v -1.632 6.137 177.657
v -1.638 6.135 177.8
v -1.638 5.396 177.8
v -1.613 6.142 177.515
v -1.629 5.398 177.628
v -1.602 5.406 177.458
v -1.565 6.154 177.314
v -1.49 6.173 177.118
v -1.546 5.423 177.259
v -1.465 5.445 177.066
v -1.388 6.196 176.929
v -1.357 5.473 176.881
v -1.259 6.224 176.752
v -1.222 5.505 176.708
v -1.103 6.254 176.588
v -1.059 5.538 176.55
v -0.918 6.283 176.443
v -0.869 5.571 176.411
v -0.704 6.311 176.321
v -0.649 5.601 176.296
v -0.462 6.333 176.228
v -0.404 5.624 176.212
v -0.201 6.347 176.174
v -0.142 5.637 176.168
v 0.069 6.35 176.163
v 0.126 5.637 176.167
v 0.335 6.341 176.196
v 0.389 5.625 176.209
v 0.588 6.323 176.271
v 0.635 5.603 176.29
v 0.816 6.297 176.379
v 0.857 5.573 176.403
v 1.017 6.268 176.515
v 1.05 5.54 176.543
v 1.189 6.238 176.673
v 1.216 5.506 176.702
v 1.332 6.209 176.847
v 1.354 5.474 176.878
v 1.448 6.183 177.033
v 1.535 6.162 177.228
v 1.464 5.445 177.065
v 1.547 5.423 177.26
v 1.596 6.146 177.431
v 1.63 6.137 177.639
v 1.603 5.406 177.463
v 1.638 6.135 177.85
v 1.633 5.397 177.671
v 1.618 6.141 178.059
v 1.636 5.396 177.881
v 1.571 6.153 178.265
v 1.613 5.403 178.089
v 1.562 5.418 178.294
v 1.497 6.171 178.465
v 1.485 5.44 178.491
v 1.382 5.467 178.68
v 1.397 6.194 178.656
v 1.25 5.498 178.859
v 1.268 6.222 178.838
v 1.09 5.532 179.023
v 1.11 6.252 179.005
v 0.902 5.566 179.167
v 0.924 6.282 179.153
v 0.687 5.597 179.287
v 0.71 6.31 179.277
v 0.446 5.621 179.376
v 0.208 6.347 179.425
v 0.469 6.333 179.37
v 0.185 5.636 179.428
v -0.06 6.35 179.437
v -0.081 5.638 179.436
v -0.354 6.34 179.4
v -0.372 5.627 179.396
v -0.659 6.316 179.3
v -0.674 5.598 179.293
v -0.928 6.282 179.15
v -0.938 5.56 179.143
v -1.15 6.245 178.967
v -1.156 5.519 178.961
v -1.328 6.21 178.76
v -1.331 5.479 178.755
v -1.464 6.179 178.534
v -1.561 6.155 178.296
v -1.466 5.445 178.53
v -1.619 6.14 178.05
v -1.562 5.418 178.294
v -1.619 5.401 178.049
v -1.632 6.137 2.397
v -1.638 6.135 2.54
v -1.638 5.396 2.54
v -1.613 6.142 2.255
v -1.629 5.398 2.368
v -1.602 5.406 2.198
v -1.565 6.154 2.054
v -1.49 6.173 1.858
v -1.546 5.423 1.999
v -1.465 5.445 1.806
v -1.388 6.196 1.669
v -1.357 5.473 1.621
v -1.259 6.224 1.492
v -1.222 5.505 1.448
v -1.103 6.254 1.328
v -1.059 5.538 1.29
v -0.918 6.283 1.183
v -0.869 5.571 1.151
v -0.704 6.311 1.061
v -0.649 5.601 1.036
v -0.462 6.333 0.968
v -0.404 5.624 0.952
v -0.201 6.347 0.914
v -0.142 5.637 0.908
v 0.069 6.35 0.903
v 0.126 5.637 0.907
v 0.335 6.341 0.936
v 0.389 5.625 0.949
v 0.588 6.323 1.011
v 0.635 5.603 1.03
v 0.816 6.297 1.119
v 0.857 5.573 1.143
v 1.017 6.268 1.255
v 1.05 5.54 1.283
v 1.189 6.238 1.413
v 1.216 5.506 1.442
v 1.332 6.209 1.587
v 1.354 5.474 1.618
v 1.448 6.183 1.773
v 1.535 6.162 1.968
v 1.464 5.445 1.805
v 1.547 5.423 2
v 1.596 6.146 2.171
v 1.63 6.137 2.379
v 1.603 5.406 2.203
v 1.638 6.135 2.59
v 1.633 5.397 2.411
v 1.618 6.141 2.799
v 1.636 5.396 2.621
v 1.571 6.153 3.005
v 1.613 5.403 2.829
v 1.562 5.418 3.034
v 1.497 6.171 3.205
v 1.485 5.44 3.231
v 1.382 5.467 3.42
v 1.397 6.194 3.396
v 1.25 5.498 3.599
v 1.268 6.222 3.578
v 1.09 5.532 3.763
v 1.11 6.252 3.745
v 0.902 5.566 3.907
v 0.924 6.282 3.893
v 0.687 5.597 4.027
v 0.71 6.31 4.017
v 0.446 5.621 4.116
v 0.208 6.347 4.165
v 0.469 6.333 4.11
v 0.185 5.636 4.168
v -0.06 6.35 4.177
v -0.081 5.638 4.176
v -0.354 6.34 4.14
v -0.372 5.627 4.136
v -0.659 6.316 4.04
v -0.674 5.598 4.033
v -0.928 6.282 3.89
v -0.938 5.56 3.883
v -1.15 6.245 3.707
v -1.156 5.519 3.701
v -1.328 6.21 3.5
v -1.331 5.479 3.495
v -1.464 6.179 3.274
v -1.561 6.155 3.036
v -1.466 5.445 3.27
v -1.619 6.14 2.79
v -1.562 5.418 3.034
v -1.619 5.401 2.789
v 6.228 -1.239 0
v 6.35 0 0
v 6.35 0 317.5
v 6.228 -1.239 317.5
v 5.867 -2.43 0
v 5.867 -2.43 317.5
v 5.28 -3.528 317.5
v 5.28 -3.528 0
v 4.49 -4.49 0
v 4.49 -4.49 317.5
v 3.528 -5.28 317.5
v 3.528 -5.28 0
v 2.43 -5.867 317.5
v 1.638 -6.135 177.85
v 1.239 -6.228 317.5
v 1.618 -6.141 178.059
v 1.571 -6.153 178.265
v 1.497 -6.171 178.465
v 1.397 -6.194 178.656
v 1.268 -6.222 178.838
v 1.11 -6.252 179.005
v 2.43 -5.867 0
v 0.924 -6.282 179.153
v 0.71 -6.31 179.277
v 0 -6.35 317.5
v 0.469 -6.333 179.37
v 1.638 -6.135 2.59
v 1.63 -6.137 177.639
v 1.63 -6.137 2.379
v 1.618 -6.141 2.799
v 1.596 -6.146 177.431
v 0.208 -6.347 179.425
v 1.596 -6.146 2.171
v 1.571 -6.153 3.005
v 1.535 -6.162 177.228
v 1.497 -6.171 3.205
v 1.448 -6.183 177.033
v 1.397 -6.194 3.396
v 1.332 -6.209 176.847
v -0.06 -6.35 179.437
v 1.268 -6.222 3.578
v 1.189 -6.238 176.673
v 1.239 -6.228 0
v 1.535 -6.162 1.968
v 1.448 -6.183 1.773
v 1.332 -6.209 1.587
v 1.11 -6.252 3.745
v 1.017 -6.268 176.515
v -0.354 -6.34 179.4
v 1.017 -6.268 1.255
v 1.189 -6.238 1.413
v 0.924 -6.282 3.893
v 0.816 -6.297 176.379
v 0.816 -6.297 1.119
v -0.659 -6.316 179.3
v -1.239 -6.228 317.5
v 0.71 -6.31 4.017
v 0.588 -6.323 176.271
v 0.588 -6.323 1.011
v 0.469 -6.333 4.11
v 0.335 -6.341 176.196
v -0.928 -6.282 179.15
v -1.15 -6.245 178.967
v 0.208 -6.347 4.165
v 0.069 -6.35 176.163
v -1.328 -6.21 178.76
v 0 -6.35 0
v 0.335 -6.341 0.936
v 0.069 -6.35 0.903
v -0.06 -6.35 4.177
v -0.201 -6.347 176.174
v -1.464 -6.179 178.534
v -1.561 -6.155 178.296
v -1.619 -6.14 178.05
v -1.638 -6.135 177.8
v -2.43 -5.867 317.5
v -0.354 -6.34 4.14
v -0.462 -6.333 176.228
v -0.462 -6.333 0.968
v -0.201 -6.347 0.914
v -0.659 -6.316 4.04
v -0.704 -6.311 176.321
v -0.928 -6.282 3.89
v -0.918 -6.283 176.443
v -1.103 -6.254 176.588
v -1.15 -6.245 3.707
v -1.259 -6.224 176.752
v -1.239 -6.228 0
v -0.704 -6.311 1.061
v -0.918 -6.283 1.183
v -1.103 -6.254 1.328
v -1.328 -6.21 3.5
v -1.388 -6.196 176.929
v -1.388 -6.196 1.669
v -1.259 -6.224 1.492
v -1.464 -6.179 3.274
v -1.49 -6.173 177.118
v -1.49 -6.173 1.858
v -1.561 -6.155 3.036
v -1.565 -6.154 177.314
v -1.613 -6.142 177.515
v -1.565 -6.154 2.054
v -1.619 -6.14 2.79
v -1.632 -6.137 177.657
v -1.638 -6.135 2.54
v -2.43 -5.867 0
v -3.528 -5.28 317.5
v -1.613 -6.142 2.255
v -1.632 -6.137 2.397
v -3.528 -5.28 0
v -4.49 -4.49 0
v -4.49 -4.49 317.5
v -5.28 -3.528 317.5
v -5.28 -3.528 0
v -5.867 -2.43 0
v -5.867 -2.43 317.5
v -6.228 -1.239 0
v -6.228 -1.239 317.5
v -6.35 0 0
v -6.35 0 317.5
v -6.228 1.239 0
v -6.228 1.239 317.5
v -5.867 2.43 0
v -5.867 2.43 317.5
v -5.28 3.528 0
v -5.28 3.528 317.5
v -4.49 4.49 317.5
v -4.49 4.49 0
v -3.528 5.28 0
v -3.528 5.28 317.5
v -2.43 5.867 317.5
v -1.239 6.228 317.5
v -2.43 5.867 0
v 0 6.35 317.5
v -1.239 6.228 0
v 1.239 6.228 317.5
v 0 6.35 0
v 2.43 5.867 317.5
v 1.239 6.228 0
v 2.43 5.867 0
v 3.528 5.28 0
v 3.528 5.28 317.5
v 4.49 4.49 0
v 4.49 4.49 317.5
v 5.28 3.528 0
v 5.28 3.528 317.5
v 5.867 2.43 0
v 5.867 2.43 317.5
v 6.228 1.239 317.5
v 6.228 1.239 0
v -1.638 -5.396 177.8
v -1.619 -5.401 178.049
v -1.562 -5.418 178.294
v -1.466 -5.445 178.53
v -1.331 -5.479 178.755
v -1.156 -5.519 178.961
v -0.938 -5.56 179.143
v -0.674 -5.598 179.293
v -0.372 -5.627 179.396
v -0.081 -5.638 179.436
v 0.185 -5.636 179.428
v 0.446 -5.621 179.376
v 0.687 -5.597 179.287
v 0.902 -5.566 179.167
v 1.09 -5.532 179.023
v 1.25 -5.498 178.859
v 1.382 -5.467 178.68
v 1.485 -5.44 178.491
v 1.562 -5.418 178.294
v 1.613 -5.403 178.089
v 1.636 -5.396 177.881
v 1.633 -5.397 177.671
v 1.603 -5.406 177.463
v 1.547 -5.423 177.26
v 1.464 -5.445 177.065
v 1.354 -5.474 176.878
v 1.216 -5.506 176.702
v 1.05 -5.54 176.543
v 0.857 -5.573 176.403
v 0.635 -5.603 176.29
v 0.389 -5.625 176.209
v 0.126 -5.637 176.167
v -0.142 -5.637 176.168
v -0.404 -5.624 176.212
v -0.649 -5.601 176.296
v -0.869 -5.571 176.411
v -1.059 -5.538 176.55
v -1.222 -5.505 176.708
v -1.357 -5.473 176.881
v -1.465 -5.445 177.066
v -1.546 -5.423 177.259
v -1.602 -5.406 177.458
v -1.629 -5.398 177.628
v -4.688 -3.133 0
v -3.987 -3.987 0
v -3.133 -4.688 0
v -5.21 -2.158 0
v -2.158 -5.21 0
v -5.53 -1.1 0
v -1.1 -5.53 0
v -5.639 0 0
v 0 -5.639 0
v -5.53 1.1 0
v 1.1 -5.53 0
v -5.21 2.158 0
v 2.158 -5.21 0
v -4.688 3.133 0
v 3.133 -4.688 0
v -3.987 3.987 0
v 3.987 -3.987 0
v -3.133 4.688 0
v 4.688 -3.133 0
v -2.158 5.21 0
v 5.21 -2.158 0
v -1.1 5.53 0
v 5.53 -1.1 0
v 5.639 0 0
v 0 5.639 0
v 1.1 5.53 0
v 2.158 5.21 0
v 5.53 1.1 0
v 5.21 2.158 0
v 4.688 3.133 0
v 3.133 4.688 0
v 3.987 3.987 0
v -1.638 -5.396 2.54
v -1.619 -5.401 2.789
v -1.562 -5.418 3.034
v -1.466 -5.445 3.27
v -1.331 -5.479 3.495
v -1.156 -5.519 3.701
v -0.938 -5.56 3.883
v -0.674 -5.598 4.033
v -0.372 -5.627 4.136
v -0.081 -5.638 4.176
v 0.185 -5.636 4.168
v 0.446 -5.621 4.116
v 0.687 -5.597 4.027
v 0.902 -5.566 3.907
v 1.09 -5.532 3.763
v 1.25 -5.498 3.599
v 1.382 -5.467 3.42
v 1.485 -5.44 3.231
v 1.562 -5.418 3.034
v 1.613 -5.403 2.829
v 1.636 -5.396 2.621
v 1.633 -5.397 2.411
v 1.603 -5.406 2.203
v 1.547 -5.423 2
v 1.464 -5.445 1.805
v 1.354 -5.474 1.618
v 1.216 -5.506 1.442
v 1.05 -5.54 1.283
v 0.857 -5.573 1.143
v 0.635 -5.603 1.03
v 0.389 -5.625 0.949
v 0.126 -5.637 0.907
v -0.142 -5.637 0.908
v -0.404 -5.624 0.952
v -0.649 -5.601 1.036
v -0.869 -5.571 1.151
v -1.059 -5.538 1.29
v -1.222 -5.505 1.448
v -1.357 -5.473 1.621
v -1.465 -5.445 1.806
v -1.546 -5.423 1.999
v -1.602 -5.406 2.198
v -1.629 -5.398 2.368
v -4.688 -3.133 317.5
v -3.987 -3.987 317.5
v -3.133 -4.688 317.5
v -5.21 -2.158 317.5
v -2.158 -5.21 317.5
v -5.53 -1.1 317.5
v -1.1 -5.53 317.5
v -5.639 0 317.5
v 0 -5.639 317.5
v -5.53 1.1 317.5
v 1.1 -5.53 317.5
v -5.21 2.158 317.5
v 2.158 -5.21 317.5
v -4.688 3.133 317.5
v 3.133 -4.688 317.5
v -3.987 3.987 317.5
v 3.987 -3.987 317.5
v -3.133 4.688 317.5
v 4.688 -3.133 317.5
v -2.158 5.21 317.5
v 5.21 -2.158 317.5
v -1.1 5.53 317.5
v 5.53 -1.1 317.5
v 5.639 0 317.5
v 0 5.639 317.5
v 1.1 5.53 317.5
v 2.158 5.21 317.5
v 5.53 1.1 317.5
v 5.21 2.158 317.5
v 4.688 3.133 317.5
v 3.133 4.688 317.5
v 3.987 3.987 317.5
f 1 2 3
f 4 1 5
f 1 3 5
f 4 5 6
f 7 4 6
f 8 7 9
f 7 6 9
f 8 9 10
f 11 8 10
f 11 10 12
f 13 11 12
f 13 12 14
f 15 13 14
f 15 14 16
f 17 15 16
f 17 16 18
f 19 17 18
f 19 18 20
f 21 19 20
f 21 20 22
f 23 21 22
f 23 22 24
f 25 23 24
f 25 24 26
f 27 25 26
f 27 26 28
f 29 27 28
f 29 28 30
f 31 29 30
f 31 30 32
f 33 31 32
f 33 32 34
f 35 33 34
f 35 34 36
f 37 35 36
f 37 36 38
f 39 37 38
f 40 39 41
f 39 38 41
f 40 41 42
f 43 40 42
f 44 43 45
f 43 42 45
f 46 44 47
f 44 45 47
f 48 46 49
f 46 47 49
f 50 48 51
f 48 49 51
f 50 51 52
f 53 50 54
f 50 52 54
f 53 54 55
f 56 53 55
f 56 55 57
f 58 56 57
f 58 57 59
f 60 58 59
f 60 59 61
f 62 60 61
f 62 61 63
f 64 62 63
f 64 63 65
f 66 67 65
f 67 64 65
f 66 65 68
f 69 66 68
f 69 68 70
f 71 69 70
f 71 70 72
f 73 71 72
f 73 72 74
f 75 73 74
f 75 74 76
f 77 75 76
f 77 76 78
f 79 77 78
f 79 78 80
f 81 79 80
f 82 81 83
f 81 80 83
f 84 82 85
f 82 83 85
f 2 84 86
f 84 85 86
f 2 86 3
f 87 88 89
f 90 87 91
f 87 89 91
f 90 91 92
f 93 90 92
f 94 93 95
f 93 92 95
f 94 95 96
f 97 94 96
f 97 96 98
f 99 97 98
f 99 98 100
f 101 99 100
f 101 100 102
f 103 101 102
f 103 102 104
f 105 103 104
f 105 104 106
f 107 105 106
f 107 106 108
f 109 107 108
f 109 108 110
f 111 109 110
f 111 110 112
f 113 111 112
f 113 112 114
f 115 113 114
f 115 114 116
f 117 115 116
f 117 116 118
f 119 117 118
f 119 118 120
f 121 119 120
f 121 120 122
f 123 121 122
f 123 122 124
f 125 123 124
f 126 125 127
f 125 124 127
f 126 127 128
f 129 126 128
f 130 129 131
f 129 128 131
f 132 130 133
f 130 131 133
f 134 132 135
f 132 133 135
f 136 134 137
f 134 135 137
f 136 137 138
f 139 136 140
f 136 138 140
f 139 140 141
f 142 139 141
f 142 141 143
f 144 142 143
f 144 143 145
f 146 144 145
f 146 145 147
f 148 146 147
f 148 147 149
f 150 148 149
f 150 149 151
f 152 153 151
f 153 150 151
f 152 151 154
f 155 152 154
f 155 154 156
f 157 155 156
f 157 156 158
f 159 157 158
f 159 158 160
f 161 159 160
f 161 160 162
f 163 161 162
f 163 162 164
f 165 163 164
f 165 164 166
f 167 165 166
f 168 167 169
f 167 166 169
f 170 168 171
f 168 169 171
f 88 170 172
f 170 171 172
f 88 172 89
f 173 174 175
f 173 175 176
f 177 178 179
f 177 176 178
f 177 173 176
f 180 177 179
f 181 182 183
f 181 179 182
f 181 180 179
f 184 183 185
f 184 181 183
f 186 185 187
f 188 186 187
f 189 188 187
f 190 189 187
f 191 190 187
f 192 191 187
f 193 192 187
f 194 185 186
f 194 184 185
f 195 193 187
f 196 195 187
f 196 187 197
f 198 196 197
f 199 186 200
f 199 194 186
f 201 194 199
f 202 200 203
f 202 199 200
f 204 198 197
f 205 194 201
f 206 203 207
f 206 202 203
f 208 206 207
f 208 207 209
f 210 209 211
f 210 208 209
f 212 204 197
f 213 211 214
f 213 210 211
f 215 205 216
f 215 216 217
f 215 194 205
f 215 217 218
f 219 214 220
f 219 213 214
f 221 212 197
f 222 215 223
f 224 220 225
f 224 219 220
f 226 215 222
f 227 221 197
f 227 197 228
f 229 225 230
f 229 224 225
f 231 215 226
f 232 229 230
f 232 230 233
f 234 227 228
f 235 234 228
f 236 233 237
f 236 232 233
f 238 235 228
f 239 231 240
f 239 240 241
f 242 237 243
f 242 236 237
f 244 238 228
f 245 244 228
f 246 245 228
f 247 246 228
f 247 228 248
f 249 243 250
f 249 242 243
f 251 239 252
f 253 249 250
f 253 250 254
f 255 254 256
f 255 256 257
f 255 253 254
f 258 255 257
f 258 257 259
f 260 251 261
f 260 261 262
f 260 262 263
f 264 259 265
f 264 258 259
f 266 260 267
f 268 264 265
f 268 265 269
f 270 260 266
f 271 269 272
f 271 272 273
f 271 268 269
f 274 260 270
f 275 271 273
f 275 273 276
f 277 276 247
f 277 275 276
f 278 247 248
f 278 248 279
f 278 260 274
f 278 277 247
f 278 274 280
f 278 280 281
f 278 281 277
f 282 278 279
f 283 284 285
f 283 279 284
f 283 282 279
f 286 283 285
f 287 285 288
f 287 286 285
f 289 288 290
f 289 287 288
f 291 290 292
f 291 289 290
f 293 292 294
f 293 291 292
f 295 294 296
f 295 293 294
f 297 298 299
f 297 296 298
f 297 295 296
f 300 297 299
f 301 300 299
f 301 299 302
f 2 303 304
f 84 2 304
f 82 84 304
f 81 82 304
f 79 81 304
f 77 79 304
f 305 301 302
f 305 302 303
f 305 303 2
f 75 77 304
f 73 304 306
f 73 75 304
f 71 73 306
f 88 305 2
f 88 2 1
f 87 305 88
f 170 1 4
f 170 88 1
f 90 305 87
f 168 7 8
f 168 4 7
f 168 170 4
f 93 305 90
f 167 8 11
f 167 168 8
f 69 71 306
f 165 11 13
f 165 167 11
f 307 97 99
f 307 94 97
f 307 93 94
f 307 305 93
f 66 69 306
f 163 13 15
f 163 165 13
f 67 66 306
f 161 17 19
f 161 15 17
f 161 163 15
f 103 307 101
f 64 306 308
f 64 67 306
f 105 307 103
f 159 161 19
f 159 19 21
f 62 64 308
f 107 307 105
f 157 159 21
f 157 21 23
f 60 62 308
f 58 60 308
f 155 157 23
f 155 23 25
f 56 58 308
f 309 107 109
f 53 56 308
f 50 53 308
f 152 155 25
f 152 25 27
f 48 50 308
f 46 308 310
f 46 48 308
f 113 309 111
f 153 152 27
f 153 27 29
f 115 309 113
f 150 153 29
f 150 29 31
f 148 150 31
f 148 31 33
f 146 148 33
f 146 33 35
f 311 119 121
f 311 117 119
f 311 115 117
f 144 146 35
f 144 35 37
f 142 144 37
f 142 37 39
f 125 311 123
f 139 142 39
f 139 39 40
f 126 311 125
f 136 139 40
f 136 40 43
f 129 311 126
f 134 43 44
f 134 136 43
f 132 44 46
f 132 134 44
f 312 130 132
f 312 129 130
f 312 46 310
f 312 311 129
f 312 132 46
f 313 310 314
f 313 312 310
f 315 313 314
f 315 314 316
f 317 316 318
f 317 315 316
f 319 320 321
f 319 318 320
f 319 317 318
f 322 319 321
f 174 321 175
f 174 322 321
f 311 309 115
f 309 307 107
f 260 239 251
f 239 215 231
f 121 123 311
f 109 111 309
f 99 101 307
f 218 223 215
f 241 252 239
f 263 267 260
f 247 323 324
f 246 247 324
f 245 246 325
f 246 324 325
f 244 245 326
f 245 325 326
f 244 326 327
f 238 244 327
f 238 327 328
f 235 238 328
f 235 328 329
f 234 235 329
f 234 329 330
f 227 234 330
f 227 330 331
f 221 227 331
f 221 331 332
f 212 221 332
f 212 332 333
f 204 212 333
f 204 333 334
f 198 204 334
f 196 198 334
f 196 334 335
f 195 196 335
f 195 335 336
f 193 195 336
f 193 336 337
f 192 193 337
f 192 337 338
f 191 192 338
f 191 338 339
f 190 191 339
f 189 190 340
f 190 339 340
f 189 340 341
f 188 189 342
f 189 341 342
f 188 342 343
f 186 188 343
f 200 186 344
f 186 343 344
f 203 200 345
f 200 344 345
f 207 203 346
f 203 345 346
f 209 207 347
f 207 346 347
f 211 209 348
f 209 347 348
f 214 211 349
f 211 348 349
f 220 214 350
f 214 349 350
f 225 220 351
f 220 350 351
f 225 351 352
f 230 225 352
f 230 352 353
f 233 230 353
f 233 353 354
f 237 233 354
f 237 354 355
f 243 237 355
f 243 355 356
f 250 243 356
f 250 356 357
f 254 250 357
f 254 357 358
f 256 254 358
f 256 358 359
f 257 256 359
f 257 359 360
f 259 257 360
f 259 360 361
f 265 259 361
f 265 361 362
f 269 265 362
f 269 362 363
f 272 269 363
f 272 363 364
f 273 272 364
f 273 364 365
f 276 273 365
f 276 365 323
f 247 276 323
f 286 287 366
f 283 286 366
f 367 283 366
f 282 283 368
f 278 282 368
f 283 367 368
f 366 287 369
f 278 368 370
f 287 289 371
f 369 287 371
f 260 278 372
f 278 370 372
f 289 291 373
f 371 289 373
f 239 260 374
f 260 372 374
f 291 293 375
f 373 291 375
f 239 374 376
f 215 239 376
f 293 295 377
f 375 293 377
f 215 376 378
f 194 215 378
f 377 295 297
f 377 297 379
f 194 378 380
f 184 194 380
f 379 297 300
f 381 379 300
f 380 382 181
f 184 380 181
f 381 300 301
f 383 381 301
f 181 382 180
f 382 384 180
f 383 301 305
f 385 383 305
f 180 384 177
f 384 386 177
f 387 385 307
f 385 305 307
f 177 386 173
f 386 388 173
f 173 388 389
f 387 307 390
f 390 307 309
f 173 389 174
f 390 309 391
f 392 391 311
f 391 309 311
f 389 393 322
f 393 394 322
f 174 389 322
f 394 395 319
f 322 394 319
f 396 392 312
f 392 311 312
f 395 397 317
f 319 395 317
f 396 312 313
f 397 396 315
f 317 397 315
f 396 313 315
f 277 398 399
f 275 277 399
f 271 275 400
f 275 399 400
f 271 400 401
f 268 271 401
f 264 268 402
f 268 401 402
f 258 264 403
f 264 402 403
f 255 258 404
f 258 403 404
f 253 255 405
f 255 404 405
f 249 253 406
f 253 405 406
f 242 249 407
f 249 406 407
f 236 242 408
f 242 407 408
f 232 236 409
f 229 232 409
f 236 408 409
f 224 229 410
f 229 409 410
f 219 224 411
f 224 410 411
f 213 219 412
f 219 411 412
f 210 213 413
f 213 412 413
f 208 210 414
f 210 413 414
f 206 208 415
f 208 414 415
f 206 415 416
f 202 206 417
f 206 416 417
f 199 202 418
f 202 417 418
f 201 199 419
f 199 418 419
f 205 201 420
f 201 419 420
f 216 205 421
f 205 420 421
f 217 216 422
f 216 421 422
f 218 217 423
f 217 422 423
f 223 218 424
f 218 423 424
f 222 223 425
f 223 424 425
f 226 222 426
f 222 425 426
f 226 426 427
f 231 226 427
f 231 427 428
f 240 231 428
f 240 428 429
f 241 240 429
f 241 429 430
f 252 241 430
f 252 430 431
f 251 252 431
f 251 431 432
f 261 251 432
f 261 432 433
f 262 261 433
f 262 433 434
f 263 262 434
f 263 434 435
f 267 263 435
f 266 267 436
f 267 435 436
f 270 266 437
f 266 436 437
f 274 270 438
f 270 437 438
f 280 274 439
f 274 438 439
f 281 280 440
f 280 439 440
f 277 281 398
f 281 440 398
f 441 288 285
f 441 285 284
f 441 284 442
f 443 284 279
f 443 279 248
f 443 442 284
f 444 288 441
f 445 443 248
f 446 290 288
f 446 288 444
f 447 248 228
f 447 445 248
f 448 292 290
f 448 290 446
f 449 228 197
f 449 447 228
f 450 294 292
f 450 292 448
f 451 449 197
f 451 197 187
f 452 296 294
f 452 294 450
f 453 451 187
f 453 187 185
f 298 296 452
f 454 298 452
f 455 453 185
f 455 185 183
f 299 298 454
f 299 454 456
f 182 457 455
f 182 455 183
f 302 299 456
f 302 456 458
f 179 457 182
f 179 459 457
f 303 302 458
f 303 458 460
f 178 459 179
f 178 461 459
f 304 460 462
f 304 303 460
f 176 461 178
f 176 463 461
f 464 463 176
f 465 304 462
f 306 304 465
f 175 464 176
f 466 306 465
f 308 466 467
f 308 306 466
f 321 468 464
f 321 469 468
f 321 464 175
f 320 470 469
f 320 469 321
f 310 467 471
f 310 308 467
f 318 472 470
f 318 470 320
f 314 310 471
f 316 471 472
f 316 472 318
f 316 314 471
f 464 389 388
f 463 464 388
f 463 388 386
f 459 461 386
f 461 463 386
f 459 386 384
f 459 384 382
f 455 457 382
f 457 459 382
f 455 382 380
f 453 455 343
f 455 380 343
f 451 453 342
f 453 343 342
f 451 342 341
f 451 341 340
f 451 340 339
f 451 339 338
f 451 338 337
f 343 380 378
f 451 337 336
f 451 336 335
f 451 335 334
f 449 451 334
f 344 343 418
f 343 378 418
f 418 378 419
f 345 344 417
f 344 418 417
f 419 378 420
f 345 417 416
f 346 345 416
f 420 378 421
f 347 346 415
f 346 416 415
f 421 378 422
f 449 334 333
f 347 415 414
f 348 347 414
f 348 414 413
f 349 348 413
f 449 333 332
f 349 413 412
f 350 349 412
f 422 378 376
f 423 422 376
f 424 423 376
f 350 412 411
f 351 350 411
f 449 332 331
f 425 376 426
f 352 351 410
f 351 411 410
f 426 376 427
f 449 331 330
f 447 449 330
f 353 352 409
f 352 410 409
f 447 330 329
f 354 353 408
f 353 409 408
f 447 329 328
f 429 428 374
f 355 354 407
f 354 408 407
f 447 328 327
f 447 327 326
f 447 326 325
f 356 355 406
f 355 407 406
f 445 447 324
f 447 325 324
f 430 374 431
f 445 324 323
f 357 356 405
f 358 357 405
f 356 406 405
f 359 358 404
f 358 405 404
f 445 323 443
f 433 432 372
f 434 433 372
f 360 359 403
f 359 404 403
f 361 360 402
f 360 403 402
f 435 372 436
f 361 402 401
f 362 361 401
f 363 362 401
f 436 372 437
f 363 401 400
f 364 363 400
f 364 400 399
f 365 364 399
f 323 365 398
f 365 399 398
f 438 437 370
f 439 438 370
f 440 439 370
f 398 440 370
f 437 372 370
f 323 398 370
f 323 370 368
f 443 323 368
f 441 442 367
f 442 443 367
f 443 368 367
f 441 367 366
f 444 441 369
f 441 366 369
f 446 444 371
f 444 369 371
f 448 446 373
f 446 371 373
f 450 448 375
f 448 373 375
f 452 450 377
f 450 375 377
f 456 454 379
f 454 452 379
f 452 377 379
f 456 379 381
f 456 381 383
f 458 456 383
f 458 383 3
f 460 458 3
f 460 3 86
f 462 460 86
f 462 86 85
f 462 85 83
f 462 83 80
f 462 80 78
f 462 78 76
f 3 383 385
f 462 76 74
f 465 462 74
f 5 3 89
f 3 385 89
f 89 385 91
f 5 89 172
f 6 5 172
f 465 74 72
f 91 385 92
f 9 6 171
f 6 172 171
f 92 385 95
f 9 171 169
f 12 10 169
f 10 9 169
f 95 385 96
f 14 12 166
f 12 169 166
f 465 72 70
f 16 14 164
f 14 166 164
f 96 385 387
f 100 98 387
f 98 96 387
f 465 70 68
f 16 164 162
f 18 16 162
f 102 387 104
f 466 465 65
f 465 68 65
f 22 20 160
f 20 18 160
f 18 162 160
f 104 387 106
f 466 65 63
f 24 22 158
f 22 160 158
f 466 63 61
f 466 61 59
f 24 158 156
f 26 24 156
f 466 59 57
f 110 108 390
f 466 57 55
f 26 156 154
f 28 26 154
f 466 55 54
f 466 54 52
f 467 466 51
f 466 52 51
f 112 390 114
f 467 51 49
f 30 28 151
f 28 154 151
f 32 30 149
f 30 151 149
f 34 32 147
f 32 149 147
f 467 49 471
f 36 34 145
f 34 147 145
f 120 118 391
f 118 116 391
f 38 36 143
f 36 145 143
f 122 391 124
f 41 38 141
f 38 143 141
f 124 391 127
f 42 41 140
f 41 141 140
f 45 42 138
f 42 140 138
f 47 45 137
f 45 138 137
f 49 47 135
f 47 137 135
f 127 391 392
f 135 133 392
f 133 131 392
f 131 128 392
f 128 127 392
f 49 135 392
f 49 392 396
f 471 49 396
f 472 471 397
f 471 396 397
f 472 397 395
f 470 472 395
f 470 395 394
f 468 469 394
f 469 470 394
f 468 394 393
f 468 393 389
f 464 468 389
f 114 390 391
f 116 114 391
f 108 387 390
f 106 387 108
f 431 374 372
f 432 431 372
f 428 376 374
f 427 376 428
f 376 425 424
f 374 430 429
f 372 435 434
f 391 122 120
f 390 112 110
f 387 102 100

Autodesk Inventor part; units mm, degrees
ref_plane "YZ Plane" through (0, 0, 0) normal (1, 0, 0) x (0, 1, 0)
ref_plane "XZ Plane" through (0, 0, 0) normal (0, 1, 0) x (-1, 0, 0)
ref_plane "XY Plane" through (0, 0, 0) normal (0, 0, 1) x (1, 0, 0)
sketch "Sketch1" plane through (0, 0, 0) normal (0, 0, 1) x (1, 0, 0)
  circle A0 centre (0, 0) radius 6.35
  circle A1 centre (0, 0) radius 5.6388
  dimension "d0" = 12.7
  dimension "d1" = 11.2776
extrude "Extrusion1" add sketch "Sketch1" along normal blind 317.5
sketch "Sketch2" plane through (0, 0, 0) normal (0, 1, 0) x (-1, 0, 0)
  line L0 (0, 0) -> (0, 382.1904) construction
  circle A0 centre (0, 2.54) radius 1.6383
  circle A1 centre (0, 177.8) radius 1.6383
  line L1 (5.6388, 0) -> (-5.6388, 0) projected
  dimension "d4" = 3.2766
  dimension "d5" = 3.2766
  dimension "d6" = 2.54
  dimension "d10" = 177.8
extrude "Extrusion2" cut sketch "Sketch2" along normal through all both and the other way through all
equation "\"d4\" = d5"
properties part number "J001401" material "STAINLESS STEEL, 304"
